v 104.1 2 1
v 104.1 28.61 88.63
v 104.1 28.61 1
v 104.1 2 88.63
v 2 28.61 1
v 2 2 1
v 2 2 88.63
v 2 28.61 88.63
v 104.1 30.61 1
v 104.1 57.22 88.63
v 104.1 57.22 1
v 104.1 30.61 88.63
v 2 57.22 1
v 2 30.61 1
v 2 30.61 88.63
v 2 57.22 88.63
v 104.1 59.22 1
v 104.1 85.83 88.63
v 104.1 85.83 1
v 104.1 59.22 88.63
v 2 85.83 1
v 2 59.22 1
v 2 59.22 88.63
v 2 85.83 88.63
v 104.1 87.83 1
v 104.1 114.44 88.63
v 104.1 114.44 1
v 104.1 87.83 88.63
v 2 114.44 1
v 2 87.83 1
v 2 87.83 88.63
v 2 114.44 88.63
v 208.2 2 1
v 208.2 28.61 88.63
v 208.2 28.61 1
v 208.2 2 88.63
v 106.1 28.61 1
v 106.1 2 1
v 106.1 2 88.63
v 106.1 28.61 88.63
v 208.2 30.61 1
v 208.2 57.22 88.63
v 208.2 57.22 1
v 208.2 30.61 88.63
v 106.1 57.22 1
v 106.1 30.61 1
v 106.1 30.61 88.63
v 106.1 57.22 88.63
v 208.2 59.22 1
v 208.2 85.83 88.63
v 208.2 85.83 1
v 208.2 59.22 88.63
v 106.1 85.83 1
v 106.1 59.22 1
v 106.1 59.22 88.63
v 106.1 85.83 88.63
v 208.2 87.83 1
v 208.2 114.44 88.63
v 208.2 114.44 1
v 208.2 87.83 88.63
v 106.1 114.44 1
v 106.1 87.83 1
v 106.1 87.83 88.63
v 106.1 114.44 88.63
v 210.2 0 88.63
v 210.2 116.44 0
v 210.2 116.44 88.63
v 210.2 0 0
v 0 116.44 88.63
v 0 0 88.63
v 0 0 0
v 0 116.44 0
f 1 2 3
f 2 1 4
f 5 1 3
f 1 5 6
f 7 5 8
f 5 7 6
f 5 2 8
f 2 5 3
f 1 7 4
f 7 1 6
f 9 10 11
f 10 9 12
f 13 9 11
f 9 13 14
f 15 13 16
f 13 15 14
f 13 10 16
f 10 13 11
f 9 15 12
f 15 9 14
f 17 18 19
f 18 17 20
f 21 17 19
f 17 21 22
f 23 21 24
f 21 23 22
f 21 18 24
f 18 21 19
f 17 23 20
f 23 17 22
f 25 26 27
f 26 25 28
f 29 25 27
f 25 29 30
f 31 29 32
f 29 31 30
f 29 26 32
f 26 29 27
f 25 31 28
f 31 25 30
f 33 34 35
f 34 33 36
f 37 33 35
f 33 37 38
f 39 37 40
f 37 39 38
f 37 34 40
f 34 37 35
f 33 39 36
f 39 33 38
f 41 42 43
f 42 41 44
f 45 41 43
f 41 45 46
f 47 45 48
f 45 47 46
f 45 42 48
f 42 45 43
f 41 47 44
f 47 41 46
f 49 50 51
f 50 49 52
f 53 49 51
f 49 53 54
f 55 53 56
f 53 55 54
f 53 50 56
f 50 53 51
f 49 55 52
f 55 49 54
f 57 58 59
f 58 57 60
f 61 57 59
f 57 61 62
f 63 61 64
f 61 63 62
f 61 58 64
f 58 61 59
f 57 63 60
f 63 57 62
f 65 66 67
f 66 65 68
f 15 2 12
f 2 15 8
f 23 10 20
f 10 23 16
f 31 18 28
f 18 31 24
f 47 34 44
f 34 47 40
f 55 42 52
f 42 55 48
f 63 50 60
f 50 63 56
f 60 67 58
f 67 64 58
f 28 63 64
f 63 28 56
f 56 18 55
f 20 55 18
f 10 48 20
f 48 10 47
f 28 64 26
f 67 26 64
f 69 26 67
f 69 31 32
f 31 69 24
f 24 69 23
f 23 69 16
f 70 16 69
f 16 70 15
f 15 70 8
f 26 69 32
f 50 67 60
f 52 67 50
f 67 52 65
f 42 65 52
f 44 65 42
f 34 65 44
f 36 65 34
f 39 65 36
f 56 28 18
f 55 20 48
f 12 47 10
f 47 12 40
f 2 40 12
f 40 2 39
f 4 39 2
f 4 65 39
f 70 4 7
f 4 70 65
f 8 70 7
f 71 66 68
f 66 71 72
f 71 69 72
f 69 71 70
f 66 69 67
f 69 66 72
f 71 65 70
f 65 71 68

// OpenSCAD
// Number of slot rows.
slot_rows=4; // [1:20]
// Number of slot columns.
slot_cols=2; // [1:20]
// height of the holder's bottom.
bottom_height=1.; // [0:0.1:10]
// How much of the drive should be in the slot.
slot_height_ratio=0.6; // [0:0.01:1]
// Size of each slot.
drive_dimensions=[146.05, 101.6, 26.11]; // [0:0.01:300]
// How big the wall separating each drive slot should be.
wall_thickness=2; // [0:0.1:20]
// Clearance for each drive slot - increases each slot's size.
clearance=0.5; // [0:0.01:2]

difference() {
    cube([
        (drive_dimensions[1]+clearance+wall_thickness)*slot_cols + wall_thickness,
        (drive_dimensions[2]+clearance+wall_thickness)*slot_rows + wall_thickness,
        drive_dimensions[0]*slot_height_ratio+bottom_height]
    );
    translate([0, 0, bottom_height])
    for (i=[0:slot_cols-1]) {
        for (j=[0:slot_rows-1]) {
            translate([
                i*(drive_dimensions[1] + clearance+wall_thickness) + wall_thickness,
                j*(drive_dimensions[2] + clearance+wall_thickness) + wall_thickness,
            ])
            cube([
                drive_dimensions[1] + clearance,
                drive_dimensions[2] + clearance,
                drive_dimensions[0] + 0.1,
            ]);
        }
    }
}
